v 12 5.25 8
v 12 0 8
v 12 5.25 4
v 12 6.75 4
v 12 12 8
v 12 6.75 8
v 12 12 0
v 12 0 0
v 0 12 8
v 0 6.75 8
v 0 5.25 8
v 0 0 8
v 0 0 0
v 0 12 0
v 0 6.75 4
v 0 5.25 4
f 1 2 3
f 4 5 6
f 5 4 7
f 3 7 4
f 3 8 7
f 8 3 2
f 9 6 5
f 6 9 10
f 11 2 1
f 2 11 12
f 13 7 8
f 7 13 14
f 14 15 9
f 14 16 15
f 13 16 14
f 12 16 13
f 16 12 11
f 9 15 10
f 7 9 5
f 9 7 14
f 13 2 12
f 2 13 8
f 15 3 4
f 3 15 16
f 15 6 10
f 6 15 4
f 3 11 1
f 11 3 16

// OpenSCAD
$fn = 32;

// ----------------------------------------------------------------------
// Micro clip: slotted block, 5-20 mm class
// ----------------------------------------------------------------------

// --- parameters (mm) ---
block_l = 12;             // block length, X
block_w = 12;             // block width, Y
block_h = 8;              // block height, Z
slot_w = 1.5;             // slot width
slot_d = 4;               // slot depth from the top

difference() {
  cube([block_l, block_w, block_h]);
  translate([-1, block_w / 2 - slot_w / 2, block_h - slot_d])
    cube([block_l + 2, slot_w, slot_d + 1]);
}
